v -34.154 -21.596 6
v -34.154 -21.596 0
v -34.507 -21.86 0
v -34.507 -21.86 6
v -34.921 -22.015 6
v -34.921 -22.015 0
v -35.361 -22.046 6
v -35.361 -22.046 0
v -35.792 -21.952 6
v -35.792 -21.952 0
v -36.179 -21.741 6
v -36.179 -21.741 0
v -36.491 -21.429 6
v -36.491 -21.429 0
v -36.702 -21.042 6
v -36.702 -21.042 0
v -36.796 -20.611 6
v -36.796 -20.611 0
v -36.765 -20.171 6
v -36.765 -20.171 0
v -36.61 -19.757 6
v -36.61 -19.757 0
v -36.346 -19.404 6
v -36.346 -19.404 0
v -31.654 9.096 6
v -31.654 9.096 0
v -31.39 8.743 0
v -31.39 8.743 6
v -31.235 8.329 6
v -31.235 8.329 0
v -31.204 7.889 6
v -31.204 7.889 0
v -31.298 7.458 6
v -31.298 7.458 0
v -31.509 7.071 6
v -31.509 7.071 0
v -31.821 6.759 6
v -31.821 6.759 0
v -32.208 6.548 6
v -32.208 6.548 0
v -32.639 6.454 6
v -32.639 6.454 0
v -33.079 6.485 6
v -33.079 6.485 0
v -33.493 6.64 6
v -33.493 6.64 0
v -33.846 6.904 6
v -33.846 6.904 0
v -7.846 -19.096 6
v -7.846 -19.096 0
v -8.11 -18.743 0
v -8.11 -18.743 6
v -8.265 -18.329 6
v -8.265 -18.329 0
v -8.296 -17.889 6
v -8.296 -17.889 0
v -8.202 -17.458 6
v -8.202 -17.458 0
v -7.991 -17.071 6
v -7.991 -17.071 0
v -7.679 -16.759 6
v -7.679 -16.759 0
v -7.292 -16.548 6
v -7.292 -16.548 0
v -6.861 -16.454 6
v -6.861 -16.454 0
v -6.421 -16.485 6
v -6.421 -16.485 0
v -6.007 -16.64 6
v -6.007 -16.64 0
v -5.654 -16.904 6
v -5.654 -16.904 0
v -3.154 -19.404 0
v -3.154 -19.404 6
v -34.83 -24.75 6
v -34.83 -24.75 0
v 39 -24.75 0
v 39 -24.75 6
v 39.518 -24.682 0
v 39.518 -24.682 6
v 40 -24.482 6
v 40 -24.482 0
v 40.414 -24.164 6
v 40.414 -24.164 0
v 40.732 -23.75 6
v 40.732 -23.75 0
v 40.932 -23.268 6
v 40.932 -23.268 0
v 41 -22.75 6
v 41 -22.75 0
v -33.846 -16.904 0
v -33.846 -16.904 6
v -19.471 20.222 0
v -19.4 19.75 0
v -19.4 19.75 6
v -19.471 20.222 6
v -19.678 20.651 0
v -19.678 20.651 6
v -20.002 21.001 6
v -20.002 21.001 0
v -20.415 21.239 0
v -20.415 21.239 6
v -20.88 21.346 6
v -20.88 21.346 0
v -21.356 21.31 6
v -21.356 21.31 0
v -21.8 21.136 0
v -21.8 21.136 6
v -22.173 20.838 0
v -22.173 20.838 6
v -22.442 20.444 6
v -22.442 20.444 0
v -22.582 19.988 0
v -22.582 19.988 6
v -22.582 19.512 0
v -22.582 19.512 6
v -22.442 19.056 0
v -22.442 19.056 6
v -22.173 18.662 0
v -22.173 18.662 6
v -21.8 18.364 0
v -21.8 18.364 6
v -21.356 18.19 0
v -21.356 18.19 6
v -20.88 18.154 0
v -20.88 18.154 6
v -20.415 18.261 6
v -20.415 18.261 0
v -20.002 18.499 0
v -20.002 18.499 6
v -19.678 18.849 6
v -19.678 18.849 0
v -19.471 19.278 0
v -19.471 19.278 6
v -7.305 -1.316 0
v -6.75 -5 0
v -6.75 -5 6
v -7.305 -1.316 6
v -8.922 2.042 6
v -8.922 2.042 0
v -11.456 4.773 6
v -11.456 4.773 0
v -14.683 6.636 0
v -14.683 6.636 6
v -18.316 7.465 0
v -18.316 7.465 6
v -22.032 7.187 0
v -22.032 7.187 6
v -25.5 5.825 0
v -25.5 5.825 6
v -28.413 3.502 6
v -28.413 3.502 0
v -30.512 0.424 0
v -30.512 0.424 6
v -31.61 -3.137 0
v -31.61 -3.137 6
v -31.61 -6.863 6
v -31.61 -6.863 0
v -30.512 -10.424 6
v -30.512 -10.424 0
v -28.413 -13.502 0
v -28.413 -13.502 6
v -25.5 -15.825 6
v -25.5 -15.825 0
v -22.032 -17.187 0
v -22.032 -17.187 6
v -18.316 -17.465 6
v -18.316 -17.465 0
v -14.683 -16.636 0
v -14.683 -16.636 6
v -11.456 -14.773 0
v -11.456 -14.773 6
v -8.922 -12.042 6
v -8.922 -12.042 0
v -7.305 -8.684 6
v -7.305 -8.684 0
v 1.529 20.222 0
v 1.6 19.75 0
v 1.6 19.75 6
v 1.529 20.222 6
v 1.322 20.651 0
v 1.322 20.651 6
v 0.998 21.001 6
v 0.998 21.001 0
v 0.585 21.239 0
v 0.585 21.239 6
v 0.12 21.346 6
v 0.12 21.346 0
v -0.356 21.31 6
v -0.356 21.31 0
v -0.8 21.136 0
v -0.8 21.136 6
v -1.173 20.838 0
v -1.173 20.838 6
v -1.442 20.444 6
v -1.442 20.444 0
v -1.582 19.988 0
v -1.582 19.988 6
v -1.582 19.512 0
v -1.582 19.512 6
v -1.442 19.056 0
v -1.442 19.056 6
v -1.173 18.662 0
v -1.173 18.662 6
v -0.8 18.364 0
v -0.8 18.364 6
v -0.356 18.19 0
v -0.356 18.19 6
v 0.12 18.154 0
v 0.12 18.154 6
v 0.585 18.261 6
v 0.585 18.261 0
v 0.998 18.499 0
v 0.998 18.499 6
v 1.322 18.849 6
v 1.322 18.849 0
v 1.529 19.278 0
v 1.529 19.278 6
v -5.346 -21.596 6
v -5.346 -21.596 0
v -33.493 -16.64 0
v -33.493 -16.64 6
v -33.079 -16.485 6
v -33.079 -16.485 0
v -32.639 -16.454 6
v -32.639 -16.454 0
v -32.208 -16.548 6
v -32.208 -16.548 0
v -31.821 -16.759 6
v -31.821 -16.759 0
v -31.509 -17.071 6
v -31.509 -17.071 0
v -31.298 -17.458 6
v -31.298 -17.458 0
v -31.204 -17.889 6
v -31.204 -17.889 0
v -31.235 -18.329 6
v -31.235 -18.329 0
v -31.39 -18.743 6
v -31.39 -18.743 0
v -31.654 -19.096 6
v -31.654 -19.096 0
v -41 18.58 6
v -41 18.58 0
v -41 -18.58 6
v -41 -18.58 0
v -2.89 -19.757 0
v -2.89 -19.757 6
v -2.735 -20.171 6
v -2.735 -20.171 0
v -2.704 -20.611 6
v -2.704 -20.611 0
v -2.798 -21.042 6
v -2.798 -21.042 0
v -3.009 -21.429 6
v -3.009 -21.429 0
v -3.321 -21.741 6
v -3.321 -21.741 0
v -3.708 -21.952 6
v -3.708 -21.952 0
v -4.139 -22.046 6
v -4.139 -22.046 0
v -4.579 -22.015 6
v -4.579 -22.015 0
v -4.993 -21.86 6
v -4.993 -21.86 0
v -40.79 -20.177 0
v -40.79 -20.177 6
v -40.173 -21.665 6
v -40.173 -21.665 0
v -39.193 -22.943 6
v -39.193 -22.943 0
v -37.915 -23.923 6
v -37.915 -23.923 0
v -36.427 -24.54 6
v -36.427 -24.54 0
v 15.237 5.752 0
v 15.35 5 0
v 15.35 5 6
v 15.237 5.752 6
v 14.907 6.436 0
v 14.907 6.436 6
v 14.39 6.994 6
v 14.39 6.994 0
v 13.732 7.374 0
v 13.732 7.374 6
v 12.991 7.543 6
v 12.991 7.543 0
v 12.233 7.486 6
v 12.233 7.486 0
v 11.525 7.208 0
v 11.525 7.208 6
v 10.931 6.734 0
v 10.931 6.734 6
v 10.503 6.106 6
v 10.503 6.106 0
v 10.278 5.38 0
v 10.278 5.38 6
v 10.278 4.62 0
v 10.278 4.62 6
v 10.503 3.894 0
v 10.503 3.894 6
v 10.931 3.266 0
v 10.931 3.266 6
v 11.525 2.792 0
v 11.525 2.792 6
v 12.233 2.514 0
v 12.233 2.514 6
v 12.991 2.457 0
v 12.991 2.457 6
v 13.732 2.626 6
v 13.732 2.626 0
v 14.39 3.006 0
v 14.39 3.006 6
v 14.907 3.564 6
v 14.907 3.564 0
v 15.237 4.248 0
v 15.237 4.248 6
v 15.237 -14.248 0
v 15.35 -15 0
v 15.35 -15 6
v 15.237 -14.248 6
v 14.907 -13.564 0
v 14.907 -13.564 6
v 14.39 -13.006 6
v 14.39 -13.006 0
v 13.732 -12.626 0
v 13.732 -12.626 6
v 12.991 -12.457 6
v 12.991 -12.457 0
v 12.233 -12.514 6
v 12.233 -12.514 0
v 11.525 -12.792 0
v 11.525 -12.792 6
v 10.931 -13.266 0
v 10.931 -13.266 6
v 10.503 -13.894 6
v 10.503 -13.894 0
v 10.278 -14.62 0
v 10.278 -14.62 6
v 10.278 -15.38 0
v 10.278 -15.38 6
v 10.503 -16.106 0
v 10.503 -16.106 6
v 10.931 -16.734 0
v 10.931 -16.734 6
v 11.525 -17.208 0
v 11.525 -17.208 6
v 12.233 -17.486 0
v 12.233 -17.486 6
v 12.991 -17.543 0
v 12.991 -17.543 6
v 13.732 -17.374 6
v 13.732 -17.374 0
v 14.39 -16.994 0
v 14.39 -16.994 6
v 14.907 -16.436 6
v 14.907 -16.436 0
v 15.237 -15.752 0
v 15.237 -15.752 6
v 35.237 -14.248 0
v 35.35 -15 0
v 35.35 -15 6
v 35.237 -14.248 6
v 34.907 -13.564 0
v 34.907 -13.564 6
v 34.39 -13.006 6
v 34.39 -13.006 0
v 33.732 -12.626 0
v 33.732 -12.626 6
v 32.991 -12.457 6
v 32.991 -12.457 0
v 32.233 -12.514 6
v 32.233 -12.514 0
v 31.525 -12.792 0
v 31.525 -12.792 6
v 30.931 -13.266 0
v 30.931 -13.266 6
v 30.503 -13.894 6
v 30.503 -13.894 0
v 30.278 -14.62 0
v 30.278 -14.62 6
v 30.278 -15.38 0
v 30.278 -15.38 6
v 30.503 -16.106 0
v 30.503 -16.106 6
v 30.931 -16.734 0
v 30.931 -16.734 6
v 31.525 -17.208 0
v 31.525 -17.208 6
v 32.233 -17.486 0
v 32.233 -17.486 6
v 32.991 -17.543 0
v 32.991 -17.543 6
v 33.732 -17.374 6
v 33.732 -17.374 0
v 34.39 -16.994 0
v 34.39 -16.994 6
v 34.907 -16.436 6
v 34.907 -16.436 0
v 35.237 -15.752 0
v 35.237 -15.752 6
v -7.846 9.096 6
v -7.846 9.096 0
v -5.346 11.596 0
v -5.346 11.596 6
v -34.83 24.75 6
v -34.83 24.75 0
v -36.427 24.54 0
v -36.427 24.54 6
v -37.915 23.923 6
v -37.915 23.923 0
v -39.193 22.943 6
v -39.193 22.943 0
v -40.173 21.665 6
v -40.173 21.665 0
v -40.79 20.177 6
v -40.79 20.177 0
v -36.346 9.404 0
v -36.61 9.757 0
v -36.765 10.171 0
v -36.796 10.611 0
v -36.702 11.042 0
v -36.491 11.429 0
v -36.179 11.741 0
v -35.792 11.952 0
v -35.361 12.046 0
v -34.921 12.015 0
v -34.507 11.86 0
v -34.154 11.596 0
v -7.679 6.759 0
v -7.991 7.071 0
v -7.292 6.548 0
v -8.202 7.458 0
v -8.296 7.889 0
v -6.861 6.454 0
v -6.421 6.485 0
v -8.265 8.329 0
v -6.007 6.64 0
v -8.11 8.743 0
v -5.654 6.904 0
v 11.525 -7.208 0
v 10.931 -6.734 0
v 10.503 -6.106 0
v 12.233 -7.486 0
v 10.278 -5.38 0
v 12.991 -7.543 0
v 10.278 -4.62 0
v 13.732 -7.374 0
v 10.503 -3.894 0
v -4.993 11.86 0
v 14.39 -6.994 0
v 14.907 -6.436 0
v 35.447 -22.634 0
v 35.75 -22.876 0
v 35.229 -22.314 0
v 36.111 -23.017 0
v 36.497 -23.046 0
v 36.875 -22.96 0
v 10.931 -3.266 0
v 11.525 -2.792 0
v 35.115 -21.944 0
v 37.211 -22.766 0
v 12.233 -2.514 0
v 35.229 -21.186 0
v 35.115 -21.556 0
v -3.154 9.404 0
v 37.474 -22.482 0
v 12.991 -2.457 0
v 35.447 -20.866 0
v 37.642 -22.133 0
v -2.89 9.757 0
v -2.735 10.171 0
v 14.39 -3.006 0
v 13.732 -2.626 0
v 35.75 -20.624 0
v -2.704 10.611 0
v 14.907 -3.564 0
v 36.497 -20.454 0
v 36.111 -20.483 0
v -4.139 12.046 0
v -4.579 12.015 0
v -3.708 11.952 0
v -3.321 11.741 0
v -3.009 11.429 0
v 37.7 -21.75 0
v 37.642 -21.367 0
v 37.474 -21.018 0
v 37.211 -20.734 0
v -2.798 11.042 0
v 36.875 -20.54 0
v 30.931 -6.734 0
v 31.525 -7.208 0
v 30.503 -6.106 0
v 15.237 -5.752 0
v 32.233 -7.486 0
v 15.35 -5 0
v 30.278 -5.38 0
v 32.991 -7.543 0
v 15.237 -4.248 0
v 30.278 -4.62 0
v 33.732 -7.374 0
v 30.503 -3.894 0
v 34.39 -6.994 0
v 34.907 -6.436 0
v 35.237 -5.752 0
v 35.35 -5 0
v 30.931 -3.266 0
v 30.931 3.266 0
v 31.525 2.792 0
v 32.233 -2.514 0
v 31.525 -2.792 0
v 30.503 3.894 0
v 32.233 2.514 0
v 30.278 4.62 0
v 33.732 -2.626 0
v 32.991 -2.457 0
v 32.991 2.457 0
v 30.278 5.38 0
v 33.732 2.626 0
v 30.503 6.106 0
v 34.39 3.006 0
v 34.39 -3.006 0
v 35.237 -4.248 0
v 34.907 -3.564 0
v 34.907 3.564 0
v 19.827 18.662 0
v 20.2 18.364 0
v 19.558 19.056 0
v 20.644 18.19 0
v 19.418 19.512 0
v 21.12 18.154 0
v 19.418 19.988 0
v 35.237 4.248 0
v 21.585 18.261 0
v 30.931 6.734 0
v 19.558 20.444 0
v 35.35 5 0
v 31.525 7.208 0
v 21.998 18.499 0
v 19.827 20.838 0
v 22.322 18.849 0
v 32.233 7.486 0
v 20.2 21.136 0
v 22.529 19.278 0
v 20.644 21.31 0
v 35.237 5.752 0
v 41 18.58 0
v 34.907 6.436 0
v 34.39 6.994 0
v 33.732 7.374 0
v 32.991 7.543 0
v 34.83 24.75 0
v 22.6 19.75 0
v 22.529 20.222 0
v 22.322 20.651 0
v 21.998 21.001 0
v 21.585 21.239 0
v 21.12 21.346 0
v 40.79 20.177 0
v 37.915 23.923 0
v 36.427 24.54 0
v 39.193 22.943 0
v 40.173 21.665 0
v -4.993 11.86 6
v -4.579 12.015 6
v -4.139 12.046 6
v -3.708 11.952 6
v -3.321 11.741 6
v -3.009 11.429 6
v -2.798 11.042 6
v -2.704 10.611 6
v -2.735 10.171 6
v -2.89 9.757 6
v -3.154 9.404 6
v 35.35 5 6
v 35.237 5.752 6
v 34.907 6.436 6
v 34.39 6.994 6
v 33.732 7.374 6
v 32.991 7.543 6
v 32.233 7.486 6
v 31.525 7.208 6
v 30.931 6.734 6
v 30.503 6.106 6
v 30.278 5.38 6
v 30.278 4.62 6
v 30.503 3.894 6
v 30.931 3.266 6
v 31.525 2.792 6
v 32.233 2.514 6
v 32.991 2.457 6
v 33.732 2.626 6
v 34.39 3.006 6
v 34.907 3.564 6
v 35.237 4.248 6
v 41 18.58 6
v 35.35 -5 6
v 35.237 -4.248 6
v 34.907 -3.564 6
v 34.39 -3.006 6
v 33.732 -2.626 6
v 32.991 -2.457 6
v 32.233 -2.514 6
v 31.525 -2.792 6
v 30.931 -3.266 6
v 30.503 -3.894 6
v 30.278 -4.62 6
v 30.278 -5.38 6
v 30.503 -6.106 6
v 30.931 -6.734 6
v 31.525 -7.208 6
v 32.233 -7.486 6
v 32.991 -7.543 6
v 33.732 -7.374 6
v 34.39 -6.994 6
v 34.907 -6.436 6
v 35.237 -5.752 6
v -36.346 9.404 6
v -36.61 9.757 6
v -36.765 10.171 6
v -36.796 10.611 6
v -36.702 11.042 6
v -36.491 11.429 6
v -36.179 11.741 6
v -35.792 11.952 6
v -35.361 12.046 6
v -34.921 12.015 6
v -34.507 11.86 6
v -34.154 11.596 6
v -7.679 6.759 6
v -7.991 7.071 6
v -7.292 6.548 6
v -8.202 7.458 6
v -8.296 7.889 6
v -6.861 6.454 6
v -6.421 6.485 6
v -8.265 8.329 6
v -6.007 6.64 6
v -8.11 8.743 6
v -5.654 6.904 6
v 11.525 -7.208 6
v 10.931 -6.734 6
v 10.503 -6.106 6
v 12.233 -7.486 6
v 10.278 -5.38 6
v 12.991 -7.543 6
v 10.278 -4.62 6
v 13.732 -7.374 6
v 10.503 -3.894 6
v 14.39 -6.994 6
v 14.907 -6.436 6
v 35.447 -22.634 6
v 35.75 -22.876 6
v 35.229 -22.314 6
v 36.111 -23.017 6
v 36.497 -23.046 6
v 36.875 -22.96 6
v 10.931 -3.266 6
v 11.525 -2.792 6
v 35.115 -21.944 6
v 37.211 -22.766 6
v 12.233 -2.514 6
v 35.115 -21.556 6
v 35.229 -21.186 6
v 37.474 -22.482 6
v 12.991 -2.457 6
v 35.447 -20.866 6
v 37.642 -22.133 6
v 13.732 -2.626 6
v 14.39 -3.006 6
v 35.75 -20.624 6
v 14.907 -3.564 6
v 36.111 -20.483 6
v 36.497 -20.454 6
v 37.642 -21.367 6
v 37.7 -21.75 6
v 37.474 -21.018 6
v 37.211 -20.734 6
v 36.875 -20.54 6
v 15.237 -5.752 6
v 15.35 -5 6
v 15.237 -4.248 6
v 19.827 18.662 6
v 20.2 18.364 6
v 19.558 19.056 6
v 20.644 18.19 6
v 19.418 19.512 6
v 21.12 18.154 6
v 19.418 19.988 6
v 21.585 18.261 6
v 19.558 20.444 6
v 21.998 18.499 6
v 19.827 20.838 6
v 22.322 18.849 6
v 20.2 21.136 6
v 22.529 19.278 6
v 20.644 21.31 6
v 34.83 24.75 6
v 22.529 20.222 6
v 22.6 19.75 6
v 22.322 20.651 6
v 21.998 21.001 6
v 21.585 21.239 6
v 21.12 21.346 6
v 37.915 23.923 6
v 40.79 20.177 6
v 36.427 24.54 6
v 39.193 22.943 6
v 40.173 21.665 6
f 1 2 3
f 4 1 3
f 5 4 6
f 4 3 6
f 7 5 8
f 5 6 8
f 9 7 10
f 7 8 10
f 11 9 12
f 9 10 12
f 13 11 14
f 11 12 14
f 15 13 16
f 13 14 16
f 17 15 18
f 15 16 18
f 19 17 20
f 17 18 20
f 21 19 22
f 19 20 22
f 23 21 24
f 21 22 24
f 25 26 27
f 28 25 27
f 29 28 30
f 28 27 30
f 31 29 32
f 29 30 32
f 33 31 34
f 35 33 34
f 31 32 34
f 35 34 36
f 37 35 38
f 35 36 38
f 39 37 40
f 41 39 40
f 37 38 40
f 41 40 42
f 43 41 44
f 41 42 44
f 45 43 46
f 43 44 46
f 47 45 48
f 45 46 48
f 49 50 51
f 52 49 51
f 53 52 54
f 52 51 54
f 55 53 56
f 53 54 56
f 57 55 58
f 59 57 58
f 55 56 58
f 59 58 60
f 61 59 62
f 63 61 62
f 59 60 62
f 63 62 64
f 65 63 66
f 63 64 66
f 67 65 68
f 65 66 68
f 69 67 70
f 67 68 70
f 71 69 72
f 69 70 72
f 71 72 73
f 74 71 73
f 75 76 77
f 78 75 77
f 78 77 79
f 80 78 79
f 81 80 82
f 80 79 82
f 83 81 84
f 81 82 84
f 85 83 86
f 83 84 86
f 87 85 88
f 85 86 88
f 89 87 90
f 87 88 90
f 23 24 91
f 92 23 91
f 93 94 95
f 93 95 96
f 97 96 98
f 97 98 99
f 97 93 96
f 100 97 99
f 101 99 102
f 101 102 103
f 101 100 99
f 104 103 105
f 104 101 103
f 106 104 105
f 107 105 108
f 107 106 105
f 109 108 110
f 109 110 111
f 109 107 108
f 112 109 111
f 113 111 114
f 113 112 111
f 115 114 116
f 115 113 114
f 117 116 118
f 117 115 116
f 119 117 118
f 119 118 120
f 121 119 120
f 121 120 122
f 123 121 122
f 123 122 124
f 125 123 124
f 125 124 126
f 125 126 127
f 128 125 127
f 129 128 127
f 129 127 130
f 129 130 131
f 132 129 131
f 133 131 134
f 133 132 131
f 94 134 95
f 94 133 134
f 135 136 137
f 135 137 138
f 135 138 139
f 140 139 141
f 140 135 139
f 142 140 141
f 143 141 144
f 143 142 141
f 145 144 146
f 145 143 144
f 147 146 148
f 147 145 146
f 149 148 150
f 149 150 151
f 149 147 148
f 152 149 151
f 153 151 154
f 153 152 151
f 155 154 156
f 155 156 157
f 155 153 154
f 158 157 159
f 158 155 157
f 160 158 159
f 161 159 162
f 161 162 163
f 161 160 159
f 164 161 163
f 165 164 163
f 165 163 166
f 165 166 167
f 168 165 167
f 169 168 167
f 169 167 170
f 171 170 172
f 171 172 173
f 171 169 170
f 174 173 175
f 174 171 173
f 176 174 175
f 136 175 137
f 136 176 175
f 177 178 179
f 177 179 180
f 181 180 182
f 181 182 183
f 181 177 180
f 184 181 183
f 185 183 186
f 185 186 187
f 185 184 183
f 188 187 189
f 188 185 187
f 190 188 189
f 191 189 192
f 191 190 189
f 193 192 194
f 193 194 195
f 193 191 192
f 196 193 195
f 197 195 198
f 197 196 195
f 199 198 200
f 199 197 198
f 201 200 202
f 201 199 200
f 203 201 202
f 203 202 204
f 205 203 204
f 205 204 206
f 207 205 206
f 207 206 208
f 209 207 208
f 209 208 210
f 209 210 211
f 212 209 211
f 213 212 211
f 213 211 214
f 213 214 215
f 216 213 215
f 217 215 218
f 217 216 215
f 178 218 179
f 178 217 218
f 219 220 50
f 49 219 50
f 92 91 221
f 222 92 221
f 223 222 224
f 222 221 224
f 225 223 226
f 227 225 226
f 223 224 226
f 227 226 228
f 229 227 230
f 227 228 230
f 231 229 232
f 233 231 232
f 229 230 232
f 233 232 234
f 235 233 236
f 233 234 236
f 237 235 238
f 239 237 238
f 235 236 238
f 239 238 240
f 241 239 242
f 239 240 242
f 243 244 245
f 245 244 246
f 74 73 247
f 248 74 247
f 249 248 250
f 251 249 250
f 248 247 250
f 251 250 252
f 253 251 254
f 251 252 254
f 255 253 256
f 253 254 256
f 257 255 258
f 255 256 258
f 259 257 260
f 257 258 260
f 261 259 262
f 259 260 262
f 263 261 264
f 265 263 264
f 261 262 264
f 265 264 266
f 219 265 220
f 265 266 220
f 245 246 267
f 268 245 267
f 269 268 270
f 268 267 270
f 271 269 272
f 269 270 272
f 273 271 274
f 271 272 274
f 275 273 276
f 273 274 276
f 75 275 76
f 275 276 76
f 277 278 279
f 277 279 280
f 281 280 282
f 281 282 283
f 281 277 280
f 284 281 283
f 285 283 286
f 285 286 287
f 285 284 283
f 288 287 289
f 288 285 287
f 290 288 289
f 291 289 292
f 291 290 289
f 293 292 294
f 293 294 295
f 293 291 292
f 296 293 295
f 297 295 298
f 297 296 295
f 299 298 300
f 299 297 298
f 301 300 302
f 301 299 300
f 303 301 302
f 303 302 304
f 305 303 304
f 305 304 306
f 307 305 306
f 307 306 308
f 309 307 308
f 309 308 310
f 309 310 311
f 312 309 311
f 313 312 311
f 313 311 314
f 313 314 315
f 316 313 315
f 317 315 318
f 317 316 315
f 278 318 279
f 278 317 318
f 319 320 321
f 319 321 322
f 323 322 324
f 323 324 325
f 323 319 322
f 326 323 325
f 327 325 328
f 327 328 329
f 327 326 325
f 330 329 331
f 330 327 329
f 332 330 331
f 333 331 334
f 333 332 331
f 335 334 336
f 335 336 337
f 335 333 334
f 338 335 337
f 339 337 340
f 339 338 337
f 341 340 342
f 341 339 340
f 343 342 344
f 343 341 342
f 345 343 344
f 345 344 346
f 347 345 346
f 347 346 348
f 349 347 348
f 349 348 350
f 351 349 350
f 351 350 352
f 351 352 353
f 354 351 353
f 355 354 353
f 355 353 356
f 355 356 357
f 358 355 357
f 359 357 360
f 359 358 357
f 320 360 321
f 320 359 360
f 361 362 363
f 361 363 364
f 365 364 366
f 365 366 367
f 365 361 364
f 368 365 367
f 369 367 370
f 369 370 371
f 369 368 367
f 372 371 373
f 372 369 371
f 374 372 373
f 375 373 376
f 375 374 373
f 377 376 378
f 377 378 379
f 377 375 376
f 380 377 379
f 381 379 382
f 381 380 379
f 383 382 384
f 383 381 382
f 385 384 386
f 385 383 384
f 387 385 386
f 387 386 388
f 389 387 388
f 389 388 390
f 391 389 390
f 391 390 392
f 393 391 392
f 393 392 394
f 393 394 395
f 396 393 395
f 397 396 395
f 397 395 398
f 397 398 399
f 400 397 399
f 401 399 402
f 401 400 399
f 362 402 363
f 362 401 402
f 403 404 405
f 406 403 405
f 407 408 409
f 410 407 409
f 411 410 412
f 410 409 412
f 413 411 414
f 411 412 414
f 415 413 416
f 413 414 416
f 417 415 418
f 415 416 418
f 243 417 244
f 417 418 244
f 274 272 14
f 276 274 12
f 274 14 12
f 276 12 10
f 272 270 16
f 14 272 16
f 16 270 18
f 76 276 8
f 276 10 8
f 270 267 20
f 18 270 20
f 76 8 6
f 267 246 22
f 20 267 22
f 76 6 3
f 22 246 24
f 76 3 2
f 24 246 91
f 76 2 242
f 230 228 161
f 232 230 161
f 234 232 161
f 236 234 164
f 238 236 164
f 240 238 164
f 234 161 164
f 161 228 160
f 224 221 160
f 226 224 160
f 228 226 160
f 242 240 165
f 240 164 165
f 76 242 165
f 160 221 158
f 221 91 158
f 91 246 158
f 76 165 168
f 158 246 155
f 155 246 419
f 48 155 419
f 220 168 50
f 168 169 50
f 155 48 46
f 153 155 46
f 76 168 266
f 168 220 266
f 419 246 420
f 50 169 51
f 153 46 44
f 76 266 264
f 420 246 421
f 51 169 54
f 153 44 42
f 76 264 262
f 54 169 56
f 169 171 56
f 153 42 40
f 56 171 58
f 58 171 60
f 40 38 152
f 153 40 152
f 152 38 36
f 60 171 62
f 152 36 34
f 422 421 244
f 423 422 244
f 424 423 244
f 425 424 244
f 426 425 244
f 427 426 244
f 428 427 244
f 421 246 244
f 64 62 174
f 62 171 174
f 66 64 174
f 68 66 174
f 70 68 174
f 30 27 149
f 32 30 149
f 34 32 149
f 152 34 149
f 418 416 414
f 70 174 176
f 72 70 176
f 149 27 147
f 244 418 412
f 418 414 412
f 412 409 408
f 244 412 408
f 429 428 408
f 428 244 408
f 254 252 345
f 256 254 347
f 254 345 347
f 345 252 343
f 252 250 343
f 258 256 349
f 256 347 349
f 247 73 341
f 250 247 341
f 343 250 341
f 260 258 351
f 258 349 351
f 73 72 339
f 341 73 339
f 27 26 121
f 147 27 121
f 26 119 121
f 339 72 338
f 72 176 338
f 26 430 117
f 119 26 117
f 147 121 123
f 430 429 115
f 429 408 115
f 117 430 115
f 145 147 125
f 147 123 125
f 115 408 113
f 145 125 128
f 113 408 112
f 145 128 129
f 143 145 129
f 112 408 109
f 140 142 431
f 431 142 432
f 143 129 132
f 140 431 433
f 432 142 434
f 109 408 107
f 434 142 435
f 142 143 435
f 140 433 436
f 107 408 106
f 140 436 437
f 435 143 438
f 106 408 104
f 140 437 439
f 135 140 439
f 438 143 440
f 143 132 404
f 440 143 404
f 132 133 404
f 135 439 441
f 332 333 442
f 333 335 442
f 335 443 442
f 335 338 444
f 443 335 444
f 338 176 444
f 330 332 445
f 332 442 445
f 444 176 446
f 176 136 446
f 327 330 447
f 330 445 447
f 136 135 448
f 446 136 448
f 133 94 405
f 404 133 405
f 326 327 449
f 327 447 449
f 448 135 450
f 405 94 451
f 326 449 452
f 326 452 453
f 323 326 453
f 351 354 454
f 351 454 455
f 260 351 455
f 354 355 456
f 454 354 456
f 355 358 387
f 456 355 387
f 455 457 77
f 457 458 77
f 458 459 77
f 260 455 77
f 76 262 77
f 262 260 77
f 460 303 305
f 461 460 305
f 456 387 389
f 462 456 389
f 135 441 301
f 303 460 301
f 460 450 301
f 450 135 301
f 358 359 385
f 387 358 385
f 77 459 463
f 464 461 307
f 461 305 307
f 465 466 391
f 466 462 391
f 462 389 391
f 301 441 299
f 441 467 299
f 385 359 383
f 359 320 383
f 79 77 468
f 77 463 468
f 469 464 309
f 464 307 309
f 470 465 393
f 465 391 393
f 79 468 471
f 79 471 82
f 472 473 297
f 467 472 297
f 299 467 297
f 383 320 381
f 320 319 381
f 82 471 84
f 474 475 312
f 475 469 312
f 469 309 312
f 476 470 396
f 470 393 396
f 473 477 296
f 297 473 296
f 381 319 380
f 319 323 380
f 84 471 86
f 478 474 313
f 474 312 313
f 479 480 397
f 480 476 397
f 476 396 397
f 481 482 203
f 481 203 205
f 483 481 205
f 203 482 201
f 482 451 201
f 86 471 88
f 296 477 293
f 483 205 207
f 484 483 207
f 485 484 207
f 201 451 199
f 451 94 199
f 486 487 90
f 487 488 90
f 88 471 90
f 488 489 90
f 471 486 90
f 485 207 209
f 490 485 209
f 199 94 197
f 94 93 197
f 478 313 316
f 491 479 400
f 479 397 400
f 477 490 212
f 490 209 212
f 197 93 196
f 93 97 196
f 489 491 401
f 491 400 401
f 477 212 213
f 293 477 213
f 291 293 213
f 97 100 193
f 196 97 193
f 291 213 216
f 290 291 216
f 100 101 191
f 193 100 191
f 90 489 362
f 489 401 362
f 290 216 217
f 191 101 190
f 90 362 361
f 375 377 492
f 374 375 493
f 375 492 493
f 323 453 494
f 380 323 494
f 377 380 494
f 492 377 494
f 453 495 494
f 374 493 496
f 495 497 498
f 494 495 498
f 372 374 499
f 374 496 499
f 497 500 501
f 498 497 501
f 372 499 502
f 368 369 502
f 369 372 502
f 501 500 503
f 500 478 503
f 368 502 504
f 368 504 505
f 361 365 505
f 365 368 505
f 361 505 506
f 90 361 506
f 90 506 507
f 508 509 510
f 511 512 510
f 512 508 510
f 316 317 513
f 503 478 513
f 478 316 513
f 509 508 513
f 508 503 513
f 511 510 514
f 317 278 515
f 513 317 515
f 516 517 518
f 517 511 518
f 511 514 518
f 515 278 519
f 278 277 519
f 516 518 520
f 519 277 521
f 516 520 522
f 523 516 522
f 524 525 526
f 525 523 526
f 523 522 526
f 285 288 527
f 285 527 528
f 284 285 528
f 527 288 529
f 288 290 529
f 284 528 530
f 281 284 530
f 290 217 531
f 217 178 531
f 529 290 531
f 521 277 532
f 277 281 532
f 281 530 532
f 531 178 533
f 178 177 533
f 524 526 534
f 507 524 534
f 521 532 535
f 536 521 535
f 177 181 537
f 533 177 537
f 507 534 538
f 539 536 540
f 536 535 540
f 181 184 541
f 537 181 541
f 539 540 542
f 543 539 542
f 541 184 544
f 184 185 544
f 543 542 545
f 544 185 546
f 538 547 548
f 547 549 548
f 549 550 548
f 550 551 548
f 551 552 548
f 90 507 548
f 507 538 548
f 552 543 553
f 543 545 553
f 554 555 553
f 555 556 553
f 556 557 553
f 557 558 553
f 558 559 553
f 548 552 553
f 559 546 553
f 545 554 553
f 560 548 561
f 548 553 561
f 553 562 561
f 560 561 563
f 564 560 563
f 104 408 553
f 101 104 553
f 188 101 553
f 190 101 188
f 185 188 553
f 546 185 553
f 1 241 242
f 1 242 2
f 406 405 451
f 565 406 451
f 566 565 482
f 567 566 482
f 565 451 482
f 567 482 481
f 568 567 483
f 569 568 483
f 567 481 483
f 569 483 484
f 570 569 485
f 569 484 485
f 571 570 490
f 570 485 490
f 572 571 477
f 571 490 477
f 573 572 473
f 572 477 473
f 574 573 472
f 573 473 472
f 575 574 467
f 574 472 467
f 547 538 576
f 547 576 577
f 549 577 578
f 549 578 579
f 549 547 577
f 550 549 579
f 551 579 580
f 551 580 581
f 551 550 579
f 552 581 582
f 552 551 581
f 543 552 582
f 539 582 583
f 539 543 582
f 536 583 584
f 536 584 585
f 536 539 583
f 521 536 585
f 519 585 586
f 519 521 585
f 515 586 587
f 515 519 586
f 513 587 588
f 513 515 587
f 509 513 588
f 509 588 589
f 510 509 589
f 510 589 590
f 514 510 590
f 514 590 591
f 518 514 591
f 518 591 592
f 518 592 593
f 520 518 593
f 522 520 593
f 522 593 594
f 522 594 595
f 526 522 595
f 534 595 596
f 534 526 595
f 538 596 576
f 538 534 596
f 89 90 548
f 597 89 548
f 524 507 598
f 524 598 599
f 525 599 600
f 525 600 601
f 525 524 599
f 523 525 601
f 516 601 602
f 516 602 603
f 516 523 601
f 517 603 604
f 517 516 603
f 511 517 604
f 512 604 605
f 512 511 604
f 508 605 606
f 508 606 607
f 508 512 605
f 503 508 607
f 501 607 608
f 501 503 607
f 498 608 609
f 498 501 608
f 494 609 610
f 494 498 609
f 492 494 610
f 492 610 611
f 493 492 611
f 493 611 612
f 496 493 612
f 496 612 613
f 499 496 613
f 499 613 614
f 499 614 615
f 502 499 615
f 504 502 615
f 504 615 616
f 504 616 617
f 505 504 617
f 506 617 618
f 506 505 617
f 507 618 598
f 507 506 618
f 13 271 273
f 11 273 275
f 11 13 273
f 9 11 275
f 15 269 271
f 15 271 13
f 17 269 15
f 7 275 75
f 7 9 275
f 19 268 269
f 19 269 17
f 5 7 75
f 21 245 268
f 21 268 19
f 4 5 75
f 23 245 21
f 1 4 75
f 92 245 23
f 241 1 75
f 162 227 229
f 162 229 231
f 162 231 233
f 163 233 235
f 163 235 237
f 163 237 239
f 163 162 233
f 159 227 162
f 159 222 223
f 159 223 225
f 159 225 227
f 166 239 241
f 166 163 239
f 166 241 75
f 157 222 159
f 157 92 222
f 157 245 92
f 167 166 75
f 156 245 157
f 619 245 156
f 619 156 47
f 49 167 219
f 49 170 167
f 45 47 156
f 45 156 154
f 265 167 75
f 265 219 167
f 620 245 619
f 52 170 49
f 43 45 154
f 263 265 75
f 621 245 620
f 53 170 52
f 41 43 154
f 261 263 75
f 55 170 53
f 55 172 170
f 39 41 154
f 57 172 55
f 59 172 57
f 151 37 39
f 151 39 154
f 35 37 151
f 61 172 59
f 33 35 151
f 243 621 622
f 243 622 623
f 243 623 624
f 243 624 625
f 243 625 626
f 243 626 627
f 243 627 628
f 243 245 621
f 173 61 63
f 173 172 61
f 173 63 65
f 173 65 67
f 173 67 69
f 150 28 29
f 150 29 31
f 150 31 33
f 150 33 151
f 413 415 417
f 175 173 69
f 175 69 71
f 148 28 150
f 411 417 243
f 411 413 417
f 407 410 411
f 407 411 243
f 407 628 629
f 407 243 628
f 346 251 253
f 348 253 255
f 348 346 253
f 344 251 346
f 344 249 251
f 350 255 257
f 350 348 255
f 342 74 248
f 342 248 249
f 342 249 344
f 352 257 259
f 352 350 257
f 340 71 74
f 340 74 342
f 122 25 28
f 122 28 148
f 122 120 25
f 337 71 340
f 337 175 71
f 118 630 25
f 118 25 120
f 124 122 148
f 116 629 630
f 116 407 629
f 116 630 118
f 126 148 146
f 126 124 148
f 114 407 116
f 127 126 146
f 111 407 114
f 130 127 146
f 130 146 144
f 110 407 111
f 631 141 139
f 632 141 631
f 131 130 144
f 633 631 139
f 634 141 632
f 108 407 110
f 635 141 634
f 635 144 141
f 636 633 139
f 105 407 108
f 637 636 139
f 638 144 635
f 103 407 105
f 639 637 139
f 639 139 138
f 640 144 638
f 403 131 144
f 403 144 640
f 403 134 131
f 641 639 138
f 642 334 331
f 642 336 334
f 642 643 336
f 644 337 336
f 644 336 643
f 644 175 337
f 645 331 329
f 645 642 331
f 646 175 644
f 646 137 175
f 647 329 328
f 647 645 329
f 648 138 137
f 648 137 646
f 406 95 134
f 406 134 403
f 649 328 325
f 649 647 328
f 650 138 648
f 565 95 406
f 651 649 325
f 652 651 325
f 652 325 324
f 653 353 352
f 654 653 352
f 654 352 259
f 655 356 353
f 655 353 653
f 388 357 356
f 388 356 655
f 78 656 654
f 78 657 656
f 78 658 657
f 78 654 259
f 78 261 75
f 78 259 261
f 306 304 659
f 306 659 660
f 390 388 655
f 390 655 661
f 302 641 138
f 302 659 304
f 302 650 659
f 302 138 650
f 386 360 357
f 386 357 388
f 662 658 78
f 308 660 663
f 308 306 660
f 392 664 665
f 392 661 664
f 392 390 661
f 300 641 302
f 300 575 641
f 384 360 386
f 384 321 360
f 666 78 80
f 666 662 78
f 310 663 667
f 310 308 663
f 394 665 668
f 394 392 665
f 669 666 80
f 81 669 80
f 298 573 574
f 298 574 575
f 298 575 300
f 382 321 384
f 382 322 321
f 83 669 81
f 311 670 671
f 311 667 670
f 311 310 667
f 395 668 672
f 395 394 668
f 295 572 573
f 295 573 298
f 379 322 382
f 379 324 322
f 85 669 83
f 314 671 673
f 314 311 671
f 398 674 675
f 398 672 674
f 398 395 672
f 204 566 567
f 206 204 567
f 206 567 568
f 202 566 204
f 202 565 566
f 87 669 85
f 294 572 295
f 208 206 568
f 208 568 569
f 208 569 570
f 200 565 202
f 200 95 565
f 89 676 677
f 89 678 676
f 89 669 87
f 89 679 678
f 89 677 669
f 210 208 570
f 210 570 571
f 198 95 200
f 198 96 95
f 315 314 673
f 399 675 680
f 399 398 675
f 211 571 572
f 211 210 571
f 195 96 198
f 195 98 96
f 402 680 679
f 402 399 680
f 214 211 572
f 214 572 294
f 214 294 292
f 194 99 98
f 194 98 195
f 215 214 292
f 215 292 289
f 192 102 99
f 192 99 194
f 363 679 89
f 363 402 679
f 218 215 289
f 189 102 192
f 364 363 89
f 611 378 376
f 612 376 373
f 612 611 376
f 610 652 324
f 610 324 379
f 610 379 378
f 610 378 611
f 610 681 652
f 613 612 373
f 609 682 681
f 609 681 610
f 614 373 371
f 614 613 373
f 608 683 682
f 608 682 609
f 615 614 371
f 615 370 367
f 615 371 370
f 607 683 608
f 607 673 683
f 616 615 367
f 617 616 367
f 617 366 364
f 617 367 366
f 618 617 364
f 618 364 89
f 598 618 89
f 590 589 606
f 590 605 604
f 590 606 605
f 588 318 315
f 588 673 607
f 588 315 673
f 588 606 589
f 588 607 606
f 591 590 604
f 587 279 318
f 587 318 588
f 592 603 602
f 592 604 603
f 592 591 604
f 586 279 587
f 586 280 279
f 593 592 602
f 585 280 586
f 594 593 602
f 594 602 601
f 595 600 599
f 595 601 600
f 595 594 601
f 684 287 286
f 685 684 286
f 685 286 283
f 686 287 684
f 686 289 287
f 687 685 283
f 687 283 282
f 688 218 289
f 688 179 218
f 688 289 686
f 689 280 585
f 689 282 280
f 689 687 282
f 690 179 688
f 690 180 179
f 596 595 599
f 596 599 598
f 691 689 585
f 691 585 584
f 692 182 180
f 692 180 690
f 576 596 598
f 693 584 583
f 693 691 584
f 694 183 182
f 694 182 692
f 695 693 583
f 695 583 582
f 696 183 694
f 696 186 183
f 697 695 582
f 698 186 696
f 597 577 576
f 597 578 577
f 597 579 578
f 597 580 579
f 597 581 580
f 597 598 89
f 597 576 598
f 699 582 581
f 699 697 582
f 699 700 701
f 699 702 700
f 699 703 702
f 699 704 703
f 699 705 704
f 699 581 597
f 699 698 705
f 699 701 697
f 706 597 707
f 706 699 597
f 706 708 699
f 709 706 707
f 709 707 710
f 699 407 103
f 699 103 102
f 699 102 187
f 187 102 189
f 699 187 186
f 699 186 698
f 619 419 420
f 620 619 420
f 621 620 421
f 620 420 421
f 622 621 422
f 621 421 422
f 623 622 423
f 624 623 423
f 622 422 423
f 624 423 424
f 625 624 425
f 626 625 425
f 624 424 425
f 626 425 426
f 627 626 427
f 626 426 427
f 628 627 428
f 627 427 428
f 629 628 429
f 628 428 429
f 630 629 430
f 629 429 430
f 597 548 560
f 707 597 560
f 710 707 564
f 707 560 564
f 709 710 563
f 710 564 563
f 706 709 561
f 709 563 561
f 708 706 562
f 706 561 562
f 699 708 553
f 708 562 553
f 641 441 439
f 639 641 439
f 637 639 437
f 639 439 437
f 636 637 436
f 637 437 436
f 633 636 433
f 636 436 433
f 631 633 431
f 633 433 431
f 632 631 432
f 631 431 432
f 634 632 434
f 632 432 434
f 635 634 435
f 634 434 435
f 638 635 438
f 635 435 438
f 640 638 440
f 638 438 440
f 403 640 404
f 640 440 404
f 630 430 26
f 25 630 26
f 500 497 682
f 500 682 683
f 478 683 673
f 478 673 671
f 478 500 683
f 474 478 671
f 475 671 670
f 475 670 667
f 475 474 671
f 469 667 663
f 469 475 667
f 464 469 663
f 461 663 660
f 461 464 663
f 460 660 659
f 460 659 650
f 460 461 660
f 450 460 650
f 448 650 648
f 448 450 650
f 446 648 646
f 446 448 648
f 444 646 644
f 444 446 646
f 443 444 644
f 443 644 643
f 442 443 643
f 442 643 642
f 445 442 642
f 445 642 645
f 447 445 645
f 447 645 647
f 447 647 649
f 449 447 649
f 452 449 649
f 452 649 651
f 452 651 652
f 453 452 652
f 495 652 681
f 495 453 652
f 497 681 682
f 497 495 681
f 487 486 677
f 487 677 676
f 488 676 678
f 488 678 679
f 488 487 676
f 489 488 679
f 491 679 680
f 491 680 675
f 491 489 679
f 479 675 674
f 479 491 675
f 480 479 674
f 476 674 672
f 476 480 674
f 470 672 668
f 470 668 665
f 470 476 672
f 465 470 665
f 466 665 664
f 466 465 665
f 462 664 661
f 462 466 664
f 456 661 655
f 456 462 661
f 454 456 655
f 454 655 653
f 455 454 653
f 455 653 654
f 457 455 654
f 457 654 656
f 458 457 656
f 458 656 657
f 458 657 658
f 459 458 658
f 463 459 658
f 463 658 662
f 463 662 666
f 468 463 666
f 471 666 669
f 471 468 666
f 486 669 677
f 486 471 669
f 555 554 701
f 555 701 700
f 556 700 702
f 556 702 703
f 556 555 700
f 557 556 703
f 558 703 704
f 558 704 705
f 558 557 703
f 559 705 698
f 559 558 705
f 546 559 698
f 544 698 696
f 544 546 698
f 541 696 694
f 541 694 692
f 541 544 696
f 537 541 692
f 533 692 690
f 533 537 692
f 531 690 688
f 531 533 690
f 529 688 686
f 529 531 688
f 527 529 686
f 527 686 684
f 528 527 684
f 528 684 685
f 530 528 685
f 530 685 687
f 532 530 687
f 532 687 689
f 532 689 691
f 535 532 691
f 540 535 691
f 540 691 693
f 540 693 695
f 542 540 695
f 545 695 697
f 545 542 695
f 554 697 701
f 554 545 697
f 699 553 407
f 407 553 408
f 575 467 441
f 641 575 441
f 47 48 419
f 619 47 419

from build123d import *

# Parameters (mm, degrees)
F0_R     = 12.5
F0_R_2   = 2.55
F0_R_3   = 1.3
F0_R_4   = 1.6
F1_DEPTH = 6


# Not quite as in the source:
# - ends of sketch curves that miss each other by under 0.0002 mm in the source are joined


with BuildPart() as f1:
    # F0 (on Top) → F1 (new body)
    with BuildSketch(Plane.XY):
        with BuildLine():
            Line((34.83, 24.75), (-34.83, 24.75))
            ThreePointArc((-34.83, 24.75), (-39.1928488399, 22.9428488399), (-41, 18.58))
            Line((-41, 18.58), (-41, -18.58))
            ThreePointArc((-41, -18.58), (-39.1928488399, -22.9428488399), (-34.83, -24.75))
            Line((-34.83, -24.75), (39, -24.75))
            ThreePointArc((39, -24.75), (40.4142135624, -24.1642135624), (41, -22.75))
            Line((41, -22.75), (41, 18.58))
            ThreePointArc((41, 18.58), (39.1928488399, 22.9428488399), (34.83, 24.75))
        make_face()
        with BuildLine():
            ThreePointArc((-34.1539839892, -21.5960150108), (-36.3460155108, -21.5960155108), (-36.3460150108, -19.4039839892))
            Line((-36.346015, -19.403984), (-33.846015, -16.903984))
            ThreePointArc((-33.8460150108, -16.9039839892), (-31.6539844892, -16.9039844892), (-31.6539839892, -19.0960150108))
            Line((-31.653984, -19.096015), (-34.153984, -21.596015))
        make_face(mode=Mode.SUBTRACT)
        with BuildLine():
            ThreePointArc((-3.1539844892, -19.4039844892), (-3.1539844892, -21.5960155108), (-5.3460155108, -21.5960155108))
            Line((-5.3460155108, -21.5960155108), (-7.846015, -19.096015))
            ThreePointArc((-7.846015, -19.096015), (-7.8460155108, -16.9039844892), (-5.6539844892, -16.9039844892))
            Line((-5.6539844892, -16.9039844892), (-3.1539844892, -19.4039844892))
        make_face(mode=Mode.SUBTRACT)
        with Locations((-19.25, -5)):
            Circle(F0_R, mode=Mode.SUBTRACT)
        with Locations((12.8, -15)):
            Circle(F0_R_2, mode=Mode.SUBTRACT)
        with Locations((36.4, -21.75)):
            Circle(F0_R_3, mode=Mode.SUBTRACT)
        with Locations((32.8, -15)):
            Circle(F0_R_2, mode=Mode.SUBTRACT)
        with Locations((12.8, -5)):
            Circle(F0_R_2, mode=Mode.SUBTRACT)
        with Locations((32.8, -5)):
            Circle(F0_R_2, mode=Mode.SUBTRACT)
        with BuildLine():
            ThreePointArc((-31.6539844892, 9.0960155108), (-31.6539844892, 6.9039844892), (-33.8460155108, 6.9039844892))
            Line((-33.8460155108, 6.9039844892), (-36.346015, 9.403985))
            ThreePointArc((-36.346015, 9.403985), (-36.3460155108, 11.5960155108), (-34.1539844892, 11.5960155108))
            Line((-34.1539844892, 11.5960155108), (-31.6539844892, 9.0960155108))
        make_face(mode=Mode.SUBTRACT)
        with BuildLine():
            ThreePointArc((-5.3460150108, 11.5960160108), (-3.1539844892, 11.5960155108), (-3.1539839892, 9.4039849892))
            Line((-3.153984, 9.403985), (-5.653984, 6.903985))
            ThreePointArc((-5.6539839892, 6.9039849892), (-7.8460155108, 6.9039844892), (-7.8460150108, 9.0960160108))
            Line((-7.846015, 9.096016), (-5.346015, 11.596016))
        make_face(mode=Mode.SUBTRACT)
        with Locations((-21, 19.75)):
            Circle(F0_R_4, mode=Mode.SUBTRACT)
        with Locations((12.8, 5)):
            Circle(F0_R_2, mode=Mode.SUBTRACT)
        with Locations((32.8, 5)):
            Circle(F0_R_2, mode=Mode.SUBTRACT)
        with Locations((0, 19.75)):
            Circle(F0_R_4, mode=Mode.SUBTRACT)
        with Locations((21, 19.75)):
            Circle(F0_R_4, mode=Mode.SUBTRACT)
    extrude(amount=F1_DEPTH)


solid = f1.part
